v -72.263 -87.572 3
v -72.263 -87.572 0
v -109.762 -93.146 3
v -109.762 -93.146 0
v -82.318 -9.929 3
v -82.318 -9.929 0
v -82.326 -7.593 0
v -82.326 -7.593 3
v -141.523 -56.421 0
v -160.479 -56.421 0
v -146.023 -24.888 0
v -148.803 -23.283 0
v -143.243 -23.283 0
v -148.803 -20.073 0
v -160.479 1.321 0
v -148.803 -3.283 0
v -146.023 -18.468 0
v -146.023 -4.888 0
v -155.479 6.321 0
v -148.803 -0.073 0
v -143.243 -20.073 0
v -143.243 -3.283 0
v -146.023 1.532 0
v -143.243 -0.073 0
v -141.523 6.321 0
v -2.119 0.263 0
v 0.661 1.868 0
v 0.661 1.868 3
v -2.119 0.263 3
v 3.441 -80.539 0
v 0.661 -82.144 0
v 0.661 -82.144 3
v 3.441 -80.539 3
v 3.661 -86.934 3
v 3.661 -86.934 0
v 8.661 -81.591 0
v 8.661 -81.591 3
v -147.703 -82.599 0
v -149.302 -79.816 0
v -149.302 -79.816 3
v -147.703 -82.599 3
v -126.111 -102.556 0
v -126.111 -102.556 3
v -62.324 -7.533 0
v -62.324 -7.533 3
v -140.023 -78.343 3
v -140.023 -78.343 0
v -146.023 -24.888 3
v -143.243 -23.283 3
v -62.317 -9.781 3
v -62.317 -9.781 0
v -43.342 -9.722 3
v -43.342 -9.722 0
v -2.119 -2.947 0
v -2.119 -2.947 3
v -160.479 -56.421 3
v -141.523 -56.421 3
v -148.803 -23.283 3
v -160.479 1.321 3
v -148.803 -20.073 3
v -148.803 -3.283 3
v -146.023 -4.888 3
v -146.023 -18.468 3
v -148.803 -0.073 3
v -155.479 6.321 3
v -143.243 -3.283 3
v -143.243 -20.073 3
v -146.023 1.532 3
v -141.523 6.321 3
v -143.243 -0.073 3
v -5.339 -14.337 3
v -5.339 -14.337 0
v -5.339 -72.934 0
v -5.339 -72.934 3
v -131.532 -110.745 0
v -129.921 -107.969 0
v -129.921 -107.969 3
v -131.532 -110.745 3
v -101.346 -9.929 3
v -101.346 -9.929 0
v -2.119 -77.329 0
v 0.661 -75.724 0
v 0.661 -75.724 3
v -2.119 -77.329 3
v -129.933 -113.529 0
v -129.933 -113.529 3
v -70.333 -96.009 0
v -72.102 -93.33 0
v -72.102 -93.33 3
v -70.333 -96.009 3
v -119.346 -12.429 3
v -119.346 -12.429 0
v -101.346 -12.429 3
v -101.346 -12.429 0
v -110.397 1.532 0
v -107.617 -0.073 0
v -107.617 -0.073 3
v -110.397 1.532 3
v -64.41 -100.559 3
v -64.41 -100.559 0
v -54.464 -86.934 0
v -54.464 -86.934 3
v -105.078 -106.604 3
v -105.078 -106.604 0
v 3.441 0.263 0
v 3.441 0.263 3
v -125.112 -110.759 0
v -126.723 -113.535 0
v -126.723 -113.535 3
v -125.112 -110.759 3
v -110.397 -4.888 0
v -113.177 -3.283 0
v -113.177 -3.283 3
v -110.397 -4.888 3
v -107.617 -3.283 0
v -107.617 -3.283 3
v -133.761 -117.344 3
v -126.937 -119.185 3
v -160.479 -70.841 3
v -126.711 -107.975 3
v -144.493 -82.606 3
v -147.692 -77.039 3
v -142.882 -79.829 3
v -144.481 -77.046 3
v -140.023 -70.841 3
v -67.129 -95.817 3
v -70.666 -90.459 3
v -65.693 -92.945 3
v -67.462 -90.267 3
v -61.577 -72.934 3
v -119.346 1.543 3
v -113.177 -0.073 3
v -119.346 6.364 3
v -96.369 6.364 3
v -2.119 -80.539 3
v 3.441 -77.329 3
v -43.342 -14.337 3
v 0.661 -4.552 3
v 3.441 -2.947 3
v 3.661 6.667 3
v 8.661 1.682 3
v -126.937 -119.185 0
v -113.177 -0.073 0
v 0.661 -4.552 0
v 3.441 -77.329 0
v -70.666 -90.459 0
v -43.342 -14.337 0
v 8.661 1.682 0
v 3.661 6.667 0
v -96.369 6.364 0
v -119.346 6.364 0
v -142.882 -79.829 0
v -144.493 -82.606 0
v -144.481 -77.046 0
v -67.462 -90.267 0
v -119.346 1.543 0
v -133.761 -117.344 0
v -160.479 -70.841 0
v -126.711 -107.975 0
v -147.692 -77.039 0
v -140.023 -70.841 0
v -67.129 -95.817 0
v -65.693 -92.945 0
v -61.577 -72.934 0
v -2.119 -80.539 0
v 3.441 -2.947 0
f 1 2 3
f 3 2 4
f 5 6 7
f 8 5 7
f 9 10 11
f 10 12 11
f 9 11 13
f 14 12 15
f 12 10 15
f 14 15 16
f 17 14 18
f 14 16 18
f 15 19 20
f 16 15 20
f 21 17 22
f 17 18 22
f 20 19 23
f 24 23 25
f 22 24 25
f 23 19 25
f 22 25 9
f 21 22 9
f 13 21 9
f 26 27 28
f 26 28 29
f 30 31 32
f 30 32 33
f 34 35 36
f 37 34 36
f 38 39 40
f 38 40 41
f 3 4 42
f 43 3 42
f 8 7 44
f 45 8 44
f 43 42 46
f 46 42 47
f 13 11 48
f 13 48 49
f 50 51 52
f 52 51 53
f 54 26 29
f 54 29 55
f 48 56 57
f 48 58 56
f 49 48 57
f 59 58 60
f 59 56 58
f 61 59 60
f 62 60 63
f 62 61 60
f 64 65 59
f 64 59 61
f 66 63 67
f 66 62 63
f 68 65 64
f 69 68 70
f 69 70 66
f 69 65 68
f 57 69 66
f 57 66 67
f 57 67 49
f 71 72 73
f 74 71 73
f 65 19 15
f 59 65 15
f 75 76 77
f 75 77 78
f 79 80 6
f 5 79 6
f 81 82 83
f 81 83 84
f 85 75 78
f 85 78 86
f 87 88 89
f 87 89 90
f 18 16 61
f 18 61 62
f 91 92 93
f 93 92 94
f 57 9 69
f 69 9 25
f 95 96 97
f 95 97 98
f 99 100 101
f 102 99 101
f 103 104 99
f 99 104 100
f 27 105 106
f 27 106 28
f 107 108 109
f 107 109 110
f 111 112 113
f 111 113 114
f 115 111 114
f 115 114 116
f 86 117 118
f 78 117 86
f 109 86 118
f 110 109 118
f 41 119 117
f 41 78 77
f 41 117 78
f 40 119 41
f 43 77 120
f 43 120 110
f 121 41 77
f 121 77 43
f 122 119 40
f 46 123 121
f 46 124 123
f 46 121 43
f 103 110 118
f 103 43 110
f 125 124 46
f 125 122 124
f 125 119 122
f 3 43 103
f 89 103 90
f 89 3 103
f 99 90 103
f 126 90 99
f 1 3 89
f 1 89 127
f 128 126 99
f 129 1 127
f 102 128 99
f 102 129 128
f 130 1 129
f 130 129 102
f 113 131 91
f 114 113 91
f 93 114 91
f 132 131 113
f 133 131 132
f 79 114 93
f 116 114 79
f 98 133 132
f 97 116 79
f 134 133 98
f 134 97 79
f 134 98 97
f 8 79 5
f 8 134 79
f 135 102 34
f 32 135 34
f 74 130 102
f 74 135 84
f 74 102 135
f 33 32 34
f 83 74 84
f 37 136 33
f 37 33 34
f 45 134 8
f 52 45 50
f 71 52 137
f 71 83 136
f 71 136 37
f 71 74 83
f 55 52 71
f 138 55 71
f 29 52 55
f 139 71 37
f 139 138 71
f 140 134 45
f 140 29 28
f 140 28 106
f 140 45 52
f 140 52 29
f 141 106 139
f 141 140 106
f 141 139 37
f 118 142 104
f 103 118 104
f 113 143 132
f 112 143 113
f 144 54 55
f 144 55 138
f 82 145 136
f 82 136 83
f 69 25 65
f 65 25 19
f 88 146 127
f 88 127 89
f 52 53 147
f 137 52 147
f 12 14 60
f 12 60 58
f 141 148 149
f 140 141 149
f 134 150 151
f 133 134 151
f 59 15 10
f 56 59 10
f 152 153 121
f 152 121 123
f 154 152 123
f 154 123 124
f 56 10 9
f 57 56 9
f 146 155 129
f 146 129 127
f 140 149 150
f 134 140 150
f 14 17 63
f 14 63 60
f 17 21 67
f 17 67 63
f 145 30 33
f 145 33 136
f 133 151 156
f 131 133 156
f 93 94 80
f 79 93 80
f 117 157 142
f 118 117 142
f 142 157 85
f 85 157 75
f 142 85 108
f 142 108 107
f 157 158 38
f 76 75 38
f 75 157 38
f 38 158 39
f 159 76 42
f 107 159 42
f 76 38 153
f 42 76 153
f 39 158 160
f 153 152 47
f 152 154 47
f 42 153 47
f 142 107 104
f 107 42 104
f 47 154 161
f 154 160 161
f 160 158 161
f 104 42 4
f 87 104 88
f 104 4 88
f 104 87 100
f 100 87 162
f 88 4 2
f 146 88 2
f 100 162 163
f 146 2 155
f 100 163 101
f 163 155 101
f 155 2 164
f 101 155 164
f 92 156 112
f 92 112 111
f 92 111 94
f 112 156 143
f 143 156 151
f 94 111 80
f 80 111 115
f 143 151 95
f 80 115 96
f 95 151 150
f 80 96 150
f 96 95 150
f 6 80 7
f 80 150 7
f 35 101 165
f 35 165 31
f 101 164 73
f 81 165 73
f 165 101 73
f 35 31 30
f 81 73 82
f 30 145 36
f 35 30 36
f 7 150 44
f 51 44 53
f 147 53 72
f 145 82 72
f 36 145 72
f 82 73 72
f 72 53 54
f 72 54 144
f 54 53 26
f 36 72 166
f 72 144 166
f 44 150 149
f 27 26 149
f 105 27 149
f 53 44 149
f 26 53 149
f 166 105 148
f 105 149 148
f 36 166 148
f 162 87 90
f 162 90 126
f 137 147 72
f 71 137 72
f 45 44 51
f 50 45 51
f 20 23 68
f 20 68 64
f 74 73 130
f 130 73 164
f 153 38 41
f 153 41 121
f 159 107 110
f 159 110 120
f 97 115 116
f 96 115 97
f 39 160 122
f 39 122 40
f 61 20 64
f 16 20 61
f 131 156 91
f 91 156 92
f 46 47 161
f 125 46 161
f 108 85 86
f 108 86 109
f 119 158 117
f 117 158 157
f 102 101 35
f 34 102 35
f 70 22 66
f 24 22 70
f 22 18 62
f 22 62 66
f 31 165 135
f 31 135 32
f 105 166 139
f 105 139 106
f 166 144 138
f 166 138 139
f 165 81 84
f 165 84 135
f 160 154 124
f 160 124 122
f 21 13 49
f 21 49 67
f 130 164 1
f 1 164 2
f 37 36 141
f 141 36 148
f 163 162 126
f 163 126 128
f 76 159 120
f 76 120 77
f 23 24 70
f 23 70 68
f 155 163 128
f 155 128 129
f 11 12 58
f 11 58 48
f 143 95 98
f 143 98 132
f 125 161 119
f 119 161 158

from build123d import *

# Parameters (mm, degrees)
BOSS_EXTRU_1_DEPTH   = 3
BOSS_EXTRU_1_2_DEPTH = 3


with BuildPart() as part:
    # Esquisse1 → Boss.-Extru.1 (new body)
    with BuildSketch(Plane.XY):
        Polygon((-160.478985875, -70.841138967), (-133.761270027, -117.344044002), (-126.936961278, -119.18521524), (-105.07834936, -106.603969177), (-64.409664562, -100.558603138), (-54.463628843, -86.933633781), (3.660893039, -86.933633781), (8.660893039, -81.591018051), (8.660893039, 1.682344915), (3.660915982, 6.667197989), (-96.368661727, 6.364168479), (-103.365175584, 6.364168479), (-119.345597764, 6.364168479), (-119.345597764, 1.542908687), (-119.346382005, -12.429484403), (-101.345774335, -12.429484403), (-101.345774335, -9.929307079), (-82.318329451, -9.929307079), (-82.325535908, -7.59335353), (-62.324350924, -7.532761958), (-62.31741501, -9.781019755), (-43.341802282, -9.722479661), (-43.341802282, -14.337028264), (-5.339106961, -14.337028264), (-5.339106961, -72.933633781), (-61.577157206, -72.933633781), (-72.263087593, -87.572177036), (-109.761976756, -93.1463556), (-126.111124489, -102.556497988), (-140.02282508, -78.342807898), (-140.02282508, -70.841138967), align=None)
        Polygon((-110.397084988, -4.888433419), (-107.617084988, -3.283399671), (-107.617084988, -0.073332174), (-110.397084988, 1.531701574), (-113.177084988, -0.073332174), (-113.177084988, -3.283399671), align=None, mode=Mode.SUBTRACT)
        Polygon((0.660893039, -4.551994484), (3.440893039, -2.946960735), (3.440893039, 0.263106761), (0.660893039, 1.86814051), (-2.119106961, 0.263106761), (-2.119106961, -2.946960735), align=None, mode=Mode.SUBTRACT)
        Polygon((0.660893039, -75.723566285), (-2.119106961, -77.328600033), (-2.119106961, -80.53866753), (0.660893039, -82.143701278), (3.440893039, -80.53866753), (3.440893039, -77.328600033), align=None, mode=Mode.SUBTRACT)
        Polygon((-70.666109178, -90.458987975), (-72.101631087, -93.330191587), (-70.332856775, -96.008991835), (-67.128560553, -95.81658847), (-65.693038643, -92.945384858), (-67.461812956, -90.266584611), align=None, mode=Mode.SUBTRACT)
        Polygon((-129.921410961, -107.968661897), (-131.53231051, -110.745267014), (-129.933149717, -113.528649505), (-126.723089375, -113.535426879), (-125.112189826, -110.758821762), (-126.711350619, -107.975439271), align=None, mode=Mode.SUBTRACT)
        Polygon((-144.493218107, -82.606038544), (-142.882318558, -79.829433427), (-144.481479351, -77.046050936), (-147.691539693, -77.039273562), (-149.302439242, -79.815878679), (-147.703278449, -82.59926117), align=None, mode=Mode.SUBTRACT)
    extrude(amount=BOSS_EXTRU_1_DEPTH)


with BuildPart() as body_2:
    # Esquisse1 → Boss.-Extru.1 2 (new body)
    with BuildSketch(Plane.XY):
        Polygon((-160.478985875, -3.429484403), (-160.478985875, -56.420747812), (-141.52282508, -56.420747812), (-141.52282508, 1.570515597), (-141.52282508, 6.320852512), (-155.478985875, 6.320852512), (-160.478985875, 1.320852512), align=None)
        Polygon((-146.02282508, -18.467800689), (-148.80282508, -20.072834437), (-148.80282508, -23.282901934), (-146.02282508, -24.887935682), (-143.24282508, -23.282901934), (-143.24282508, -20.072834437), align=None, mode=Mode.SUBTRACT)
        Polygon((-146.02282508, -4.887935682), (-143.24282508, -3.282901934), (-143.24282508, -0.072834437), (-146.02282508, 1.532199311), (-148.80282508, -0.072834437), (-148.80282508, -3.282901934), align=None, mode=Mode.SUBTRACT)
    extrude(amount=BOSS_EXTRU_1_2_DEPTH)


solid = Compound([part.part, body_2.part])
